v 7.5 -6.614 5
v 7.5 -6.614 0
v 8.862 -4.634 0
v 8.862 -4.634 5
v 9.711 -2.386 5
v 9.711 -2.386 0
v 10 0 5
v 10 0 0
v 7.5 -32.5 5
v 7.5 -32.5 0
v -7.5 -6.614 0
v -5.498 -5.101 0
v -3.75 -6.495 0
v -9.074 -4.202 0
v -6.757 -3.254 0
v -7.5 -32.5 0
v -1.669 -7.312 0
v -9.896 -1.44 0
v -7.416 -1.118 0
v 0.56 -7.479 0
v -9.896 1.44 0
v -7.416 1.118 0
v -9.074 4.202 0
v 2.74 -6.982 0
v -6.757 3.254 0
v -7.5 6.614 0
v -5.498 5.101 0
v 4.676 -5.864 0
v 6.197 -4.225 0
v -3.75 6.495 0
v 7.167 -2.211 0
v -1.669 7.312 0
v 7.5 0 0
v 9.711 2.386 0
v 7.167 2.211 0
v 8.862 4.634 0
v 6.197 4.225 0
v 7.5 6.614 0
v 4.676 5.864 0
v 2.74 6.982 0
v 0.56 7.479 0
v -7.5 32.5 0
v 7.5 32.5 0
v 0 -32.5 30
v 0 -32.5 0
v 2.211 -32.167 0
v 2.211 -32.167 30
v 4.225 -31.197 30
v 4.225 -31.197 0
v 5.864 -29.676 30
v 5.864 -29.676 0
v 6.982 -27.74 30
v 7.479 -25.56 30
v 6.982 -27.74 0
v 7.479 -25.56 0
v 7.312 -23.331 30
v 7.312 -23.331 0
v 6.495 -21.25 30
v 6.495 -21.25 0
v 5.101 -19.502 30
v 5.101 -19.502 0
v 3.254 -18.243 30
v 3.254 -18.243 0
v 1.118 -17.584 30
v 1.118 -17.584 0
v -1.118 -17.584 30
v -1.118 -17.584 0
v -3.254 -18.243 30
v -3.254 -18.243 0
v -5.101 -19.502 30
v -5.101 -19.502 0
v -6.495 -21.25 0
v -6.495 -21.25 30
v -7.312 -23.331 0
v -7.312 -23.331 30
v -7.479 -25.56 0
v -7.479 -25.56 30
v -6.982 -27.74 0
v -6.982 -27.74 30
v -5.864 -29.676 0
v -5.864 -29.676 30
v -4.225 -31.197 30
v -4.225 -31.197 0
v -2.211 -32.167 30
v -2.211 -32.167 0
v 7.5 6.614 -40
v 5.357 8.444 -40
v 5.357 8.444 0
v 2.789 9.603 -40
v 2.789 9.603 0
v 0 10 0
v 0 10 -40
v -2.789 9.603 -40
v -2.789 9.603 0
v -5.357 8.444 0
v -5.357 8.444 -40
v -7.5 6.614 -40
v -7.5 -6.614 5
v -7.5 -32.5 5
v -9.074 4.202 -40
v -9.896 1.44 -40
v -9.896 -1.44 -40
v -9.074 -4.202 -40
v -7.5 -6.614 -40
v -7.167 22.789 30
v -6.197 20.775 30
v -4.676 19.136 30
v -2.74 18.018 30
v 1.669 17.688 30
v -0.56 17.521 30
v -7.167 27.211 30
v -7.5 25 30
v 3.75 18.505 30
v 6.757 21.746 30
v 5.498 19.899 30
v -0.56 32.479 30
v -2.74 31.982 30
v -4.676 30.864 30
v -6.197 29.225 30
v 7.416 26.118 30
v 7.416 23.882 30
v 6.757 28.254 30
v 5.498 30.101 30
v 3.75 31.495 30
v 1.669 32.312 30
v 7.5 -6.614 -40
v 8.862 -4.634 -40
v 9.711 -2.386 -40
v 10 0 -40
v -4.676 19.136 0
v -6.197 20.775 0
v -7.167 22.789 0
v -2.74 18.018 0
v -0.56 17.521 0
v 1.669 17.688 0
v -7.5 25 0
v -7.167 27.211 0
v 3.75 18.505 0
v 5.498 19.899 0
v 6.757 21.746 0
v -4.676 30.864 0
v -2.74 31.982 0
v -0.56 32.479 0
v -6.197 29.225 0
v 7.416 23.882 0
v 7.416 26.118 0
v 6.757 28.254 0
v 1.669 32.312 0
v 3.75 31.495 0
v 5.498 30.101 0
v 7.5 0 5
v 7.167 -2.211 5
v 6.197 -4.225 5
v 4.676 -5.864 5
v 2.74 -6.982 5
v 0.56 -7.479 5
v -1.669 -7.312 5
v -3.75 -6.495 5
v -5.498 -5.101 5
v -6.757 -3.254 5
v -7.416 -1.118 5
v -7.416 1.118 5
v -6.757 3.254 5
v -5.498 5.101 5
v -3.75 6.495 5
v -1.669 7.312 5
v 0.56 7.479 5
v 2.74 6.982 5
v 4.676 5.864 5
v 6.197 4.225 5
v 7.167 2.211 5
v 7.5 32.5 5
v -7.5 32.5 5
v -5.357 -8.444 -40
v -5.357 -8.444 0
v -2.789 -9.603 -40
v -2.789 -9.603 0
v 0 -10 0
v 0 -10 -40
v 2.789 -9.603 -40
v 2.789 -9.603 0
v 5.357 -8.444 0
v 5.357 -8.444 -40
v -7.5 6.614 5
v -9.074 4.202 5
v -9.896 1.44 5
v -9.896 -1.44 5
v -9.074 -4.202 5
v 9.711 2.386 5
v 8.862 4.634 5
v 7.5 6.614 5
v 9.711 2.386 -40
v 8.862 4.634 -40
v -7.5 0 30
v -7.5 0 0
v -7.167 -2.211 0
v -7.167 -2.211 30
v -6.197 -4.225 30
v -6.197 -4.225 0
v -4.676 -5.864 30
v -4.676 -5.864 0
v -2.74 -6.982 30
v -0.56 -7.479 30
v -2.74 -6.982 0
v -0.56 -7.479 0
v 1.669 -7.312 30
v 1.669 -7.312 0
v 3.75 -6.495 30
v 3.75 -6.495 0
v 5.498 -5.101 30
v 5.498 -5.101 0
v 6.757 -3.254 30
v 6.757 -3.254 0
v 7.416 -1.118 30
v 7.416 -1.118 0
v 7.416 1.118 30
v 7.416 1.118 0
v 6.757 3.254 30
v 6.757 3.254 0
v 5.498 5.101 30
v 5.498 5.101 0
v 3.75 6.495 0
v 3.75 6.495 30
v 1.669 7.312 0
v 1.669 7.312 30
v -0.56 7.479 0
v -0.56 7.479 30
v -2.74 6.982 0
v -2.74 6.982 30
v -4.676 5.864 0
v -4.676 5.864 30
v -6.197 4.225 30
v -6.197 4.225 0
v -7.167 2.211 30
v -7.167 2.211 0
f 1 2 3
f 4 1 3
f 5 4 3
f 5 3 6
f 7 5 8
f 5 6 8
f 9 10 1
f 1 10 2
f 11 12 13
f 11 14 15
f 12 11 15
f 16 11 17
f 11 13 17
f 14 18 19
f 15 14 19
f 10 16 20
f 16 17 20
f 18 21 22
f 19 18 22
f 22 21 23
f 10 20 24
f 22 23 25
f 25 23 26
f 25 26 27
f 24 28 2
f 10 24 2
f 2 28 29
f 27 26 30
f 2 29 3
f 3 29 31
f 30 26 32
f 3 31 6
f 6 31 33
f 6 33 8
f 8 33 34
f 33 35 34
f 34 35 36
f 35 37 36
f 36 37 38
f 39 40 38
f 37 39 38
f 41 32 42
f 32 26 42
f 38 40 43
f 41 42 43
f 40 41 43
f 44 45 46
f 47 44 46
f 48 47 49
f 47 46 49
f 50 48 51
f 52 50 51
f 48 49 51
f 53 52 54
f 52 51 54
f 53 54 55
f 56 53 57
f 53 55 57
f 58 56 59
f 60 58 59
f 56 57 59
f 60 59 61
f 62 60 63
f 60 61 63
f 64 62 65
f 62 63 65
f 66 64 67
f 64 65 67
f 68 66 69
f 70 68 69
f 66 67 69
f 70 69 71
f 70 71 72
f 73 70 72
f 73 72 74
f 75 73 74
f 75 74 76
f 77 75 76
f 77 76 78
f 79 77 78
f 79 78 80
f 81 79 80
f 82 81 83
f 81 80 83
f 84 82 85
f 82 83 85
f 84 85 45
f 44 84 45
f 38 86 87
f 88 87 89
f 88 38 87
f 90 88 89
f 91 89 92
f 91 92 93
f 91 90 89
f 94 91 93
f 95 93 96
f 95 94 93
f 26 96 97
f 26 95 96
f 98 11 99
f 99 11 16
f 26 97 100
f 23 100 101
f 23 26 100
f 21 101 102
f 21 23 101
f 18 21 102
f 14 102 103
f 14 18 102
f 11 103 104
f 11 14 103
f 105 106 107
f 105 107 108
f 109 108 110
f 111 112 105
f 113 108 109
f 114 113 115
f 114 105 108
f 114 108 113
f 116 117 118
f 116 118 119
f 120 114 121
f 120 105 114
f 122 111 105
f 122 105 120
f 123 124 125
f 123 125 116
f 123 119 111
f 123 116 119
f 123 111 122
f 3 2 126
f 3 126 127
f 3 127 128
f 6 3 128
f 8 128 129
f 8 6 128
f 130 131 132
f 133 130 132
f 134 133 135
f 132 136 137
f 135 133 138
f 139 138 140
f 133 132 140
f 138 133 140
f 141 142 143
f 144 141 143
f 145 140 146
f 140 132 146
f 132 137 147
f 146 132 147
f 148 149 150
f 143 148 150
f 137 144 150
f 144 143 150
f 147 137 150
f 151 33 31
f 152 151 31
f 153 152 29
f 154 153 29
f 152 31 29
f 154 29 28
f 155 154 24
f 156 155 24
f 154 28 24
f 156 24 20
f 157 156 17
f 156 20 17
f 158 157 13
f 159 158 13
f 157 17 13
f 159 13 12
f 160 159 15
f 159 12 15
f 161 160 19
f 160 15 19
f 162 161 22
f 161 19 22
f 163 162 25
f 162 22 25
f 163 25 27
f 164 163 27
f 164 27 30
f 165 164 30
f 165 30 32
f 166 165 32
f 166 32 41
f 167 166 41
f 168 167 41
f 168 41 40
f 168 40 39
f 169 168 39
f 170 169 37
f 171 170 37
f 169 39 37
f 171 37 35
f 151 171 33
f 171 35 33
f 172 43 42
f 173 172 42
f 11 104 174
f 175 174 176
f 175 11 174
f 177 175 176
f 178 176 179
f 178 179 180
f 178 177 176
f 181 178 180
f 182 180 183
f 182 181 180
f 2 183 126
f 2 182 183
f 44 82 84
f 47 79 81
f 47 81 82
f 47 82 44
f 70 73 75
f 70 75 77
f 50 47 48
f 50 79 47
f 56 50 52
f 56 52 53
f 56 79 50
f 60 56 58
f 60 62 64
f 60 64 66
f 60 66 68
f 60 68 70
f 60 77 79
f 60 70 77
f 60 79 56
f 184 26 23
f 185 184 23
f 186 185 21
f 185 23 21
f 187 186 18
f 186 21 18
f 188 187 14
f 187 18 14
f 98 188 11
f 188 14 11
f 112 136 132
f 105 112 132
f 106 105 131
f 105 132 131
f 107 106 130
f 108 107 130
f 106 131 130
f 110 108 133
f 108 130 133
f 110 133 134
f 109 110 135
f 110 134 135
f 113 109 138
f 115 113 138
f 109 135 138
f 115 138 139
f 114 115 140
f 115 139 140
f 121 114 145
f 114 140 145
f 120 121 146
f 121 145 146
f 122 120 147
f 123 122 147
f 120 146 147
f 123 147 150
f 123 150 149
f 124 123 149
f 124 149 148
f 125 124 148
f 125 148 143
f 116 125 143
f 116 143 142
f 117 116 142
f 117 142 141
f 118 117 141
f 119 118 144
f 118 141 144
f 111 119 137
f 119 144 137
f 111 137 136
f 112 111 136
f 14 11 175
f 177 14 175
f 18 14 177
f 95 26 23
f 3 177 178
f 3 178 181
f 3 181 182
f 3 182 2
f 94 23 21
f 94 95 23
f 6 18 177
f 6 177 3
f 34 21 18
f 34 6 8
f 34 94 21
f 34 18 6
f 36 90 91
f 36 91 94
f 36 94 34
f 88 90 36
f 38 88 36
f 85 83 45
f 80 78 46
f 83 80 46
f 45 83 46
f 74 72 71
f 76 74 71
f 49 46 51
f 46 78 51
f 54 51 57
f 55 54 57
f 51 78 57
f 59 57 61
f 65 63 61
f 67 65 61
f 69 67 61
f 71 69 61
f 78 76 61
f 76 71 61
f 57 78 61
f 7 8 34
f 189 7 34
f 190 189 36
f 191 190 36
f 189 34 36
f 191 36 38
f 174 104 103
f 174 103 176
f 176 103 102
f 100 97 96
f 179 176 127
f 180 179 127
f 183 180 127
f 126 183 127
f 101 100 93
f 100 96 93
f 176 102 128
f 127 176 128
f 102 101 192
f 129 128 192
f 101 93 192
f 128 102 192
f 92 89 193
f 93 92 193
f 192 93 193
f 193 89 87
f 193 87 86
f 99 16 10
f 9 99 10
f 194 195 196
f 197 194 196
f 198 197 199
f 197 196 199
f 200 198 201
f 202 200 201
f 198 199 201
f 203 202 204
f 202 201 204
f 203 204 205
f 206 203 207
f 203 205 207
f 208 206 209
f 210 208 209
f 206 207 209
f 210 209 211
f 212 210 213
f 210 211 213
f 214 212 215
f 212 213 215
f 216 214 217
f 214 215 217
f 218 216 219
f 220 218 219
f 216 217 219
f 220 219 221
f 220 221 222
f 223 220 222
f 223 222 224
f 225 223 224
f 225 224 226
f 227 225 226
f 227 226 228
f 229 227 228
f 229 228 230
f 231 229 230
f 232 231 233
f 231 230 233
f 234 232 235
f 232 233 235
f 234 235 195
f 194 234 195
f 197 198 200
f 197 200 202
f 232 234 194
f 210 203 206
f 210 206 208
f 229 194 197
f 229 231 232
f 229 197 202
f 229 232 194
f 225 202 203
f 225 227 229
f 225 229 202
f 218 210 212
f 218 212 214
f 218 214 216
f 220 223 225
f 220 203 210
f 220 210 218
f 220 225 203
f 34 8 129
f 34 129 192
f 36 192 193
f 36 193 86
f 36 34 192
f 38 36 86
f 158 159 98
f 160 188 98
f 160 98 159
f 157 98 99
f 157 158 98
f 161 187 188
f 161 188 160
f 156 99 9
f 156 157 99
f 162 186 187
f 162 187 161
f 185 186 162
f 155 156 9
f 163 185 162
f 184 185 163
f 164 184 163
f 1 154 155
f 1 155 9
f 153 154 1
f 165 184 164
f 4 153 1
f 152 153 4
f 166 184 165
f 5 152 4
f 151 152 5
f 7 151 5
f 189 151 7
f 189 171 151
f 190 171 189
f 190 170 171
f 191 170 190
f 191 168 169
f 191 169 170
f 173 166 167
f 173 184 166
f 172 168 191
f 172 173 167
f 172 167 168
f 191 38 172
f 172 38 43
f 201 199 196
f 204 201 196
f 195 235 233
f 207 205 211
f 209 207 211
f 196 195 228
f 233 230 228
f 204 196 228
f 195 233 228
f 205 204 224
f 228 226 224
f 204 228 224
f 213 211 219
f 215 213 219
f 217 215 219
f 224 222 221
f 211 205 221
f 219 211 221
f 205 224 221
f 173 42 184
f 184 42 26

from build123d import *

# Parameters (mm, degrees)
F1_DEPTH = 5
F2_DEPTH = 30
F3_DEPTH = 40


with BuildPart() as f1:
    # F0 (on Top) → F1 (new body)
    with BuildSketch(Plane.XY):
        with BuildLine():
            Line((0, 32.5), (-7.5, 32.5))
            Line((-7.5, 32.5), (-7.5, 25))
            ThreePointArc((-7.5, 25), (-5.3033008589, 30.3033008589), (0, 32.5))
        make_face()
        with BuildLine():
            Line((7.5, 32.5), (0, 32.5))
            ThreePointArc((0, 32.5), (5.3033008589, 30.3033008589), (7.5, 25))
            Line((7.5, 25), (7.5, 32.5))
        make_face()
        with BuildLine():
            ThreePointArc((7.5, 25), (5.3033008589, 30.3033008589), (0, 32.5))
            ThreePointArc((0, 32.5), (-5.3033008589, 30.3033008589), (-7.5, 25))
            ThreePointArc((-7.5, 25), (0, 17.5), (7.5, 25))
        make_face()
        with BuildLine():
            ThreePointArc((7.5, 25), (0, 17.5), (-7.5, 25))
            Line((-7.5, 25), (-7.5, 6.6143782777))
            ThreePointArc((-7.5, 6.6143782777), (0, 10), (7.5, 6.6143782777))
            Line((7.5, 6.6143782777), (7.5, 25))
        make_face()
        with BuildLine():
            ThreePointArc((7.5, 6.6143782777), (0, 10), (-7.5, 6.6143782777))
            Line((-7.5, 6.6143782777), (-7.5, -5.5e-08))
            ThreePointArc((-7.5, -5.5e-08), (-2.75e-08, 7.5), (7.5, 0))
            Line((7.5, 0), (7.5, 6.6143782777))
        make_face()
        with BuildLine():
            Line((-7.5, -5.5e-08), (-7.5, 6.6143782777))
            ThreePointArc((-7.5, 6.6143782777), (-10, 0), (-7.5, -6.6143782777))
            Line((-7.5, -6.6143782777), (-7.5, -5.5e-08))
        make_face()
        with BuildLine():
            ThreePointArc((10, 0), (9.3541434669, 3.5355339059), (7.5, 6.6143782777))
            Line((7.5, 6.6143782777), (7.5, 0))
            Line((7.5, 0), (7.5, -6.6143782777))
            ThreePointArc((7.5, -6.6143782777), (9.3541434669, -3.5355339059), (10, 0))
        make_face()
        with BuildLine():
            ThreePointArc((7.5, 0), (2.75e-08, -7.5), (-7.5, -5.5e-08))
            Line((-7.5, -5.5e-08), (-7.5, -6.6143782777))
            ThreePointArc((-7.5, -6.6143782777), (0, -10), (7.5, -6.6143782777))
            Line((7.5, -6.6143782777), (7.5, 0))
        make_face()
        with BuildLine():
            ThreePointArc((7.5, -6.6143782777), (0, -10), (-7.5, -6.6143782777))
            Line((-7.5, -6.6143782777), (-7.5, -25.0000000374))
            ThreePointArc((-7.5, -25.0000000374), (-1.87e-08, -17.5), (7.5, -25))
            Line((7.5, -25), (7.5, -6.6143782777))
        make_face()
        with BuildLine():
            ThreePointArc((0, -32.5), (-5.3033008457, -30.3033008721), (-7.5, -25.0000000374))
            Line((-7.5, -25.0000000374), (-7.5, -32.5))
            Line((-7.5, -32.5), (0, -32.5))
        make_face()
        with BuildLine():
            ThreePointArc((7.5, -25), (-1.87e-08, -17.5), (-7.5, -25.0000000374))
            ThreePointArc((-7.5, -25.0000000374), (-5.3033008457, -30.3033008721), (0, -32.5))
            ThreePointArc((0, -32.5), (5.3033008589, -30.3033008589), (7.5, -25))
        make_face()
        with BuildLine():
            Line((7.5, -32.5), (7.5, -25))
            ThreePointArc((7.5, -25), (5.3033008589, -30.3033008589), (0, -32.5))
            Line((0, -32.5), (7.5, -32.5))
        make_face()
    extrude(amount=F1_DEPTH)


with BuildPart() as f2:
    # F0 (on Top) → F2 (new body)
    with BuildSketch(Plane.XY):
        with BuildLine():
            ThreePointArc((7.5, 0), (-2.75e-08, 7.5), (-7.5, -5.5e-08))
            ThreePointArc((-7.5, -5.5e-08), (2.75e-08, -7.5), (7.5, 0))
        make_face()
    extrude(amount=F2_DEPTH)


with BuildPart() as f2b:
    # F0 (on Top) → F2, piece 2 (new body)
    with BuildSketch(Plane.XY):
        with BuildLine():
            ThreePointArc((7.5, -25), (-1.87e-08, -17.5), (-7.5, -25.0000000374))
            ThreePointArc((-7.5, -25.0000000374), (-5.3033008457, -30.3033008721), (0, -32.5))
            ThreePointArc((0, -32.5), (5.3033008589, -30.3033008589), (7.5, -25))
        make_face()
    extrude(amount=F2_DEPTH)


with BuildPart() as f2c:
    # F0 (on Top) → F2, piece 3 (new body)
    with BuildSketch(Plane.XY):
        with BuildLine():
            ThreePointArc((7.5, 25), (5.3033008589, 30.3033008589), (0, 32.5))
            ThreePointArc((0, 32.5), (-5.3033008589, 30.3033008589), (-7.5, 25))
            ThreePointArc((-7.5, 25), (0, 17.5), (7.5, 25))
        make_face()
    extrude(amount=F2_DEPTH)


with BuildPart() as f3:
    # F0 (on Top) → F3 (new body)
    with BuildSketch(Plane.XY):
        with BuildLine():
            Line((-7.5, -5.5e-08), (-7.5, 6.6143782777))
            ThreePointArc((-7.5, 6.6143782777), (-10, 0), (-7.5, -6.6143782777))
            Line((-7.5, -6.6143782777), (-7.5, -5.5e-08))
        make_face()
        with BuildLine():
            ThreePointArc((7.5, 6.6143782777), (0, 10), (-7.5, 6.6143782777))
            Line((-7.5, 6.6143782777), (-7.5, -5.5e-08))
            ThreePointArc((-7.5, -5.5e-08), (-2.75e-08, 7.5), (7.5, 0))
            Line((7.5, 0), (7.5, 6.6143782777))
        make_face()
        with BuildLine():
            ThreePointArc((10, 0), (9.3541434669, 3.5355339059), (7.5, 6.6143782777))
            Line((7.5, 6.6143782777), (7.5, 0))
            Line((7.5, 0), (7.5, -6.6143782777))
            ThreePointArc((7.5, -6.6143782777), (9.3541434669, -3.5355339059), (10, 0))
        make_face()
        with BuildLine():
            ThreePointArc((7.5, 0), (2.75e-08, -7.5), (-7.5, -5.5e-08))
            Line((-7.5, -5.5e-08), (-7.5, -6.6143782777))
            ThreePointArc((-7.5, -6.6143782777), (0, -10), (7.5, -6.6143782777))
            Line((7.5, -6.6143782777), (7.5, 0))
        make_face()
        with BuildLine():
            ThreePointArc((7.5, 0), (-2.75e-08, 7.5), (-7.5, -5.5e-08))
            ThreePointArc((-7.5, -5.5e-08), (2.75e-08, -7.5), (7.5, 0))
        make_face()
    extrude(amount=-F3_DEPTH)


solid = Compound([f1.part, f2.part, f2b.part, f2c.part, f3.part])
